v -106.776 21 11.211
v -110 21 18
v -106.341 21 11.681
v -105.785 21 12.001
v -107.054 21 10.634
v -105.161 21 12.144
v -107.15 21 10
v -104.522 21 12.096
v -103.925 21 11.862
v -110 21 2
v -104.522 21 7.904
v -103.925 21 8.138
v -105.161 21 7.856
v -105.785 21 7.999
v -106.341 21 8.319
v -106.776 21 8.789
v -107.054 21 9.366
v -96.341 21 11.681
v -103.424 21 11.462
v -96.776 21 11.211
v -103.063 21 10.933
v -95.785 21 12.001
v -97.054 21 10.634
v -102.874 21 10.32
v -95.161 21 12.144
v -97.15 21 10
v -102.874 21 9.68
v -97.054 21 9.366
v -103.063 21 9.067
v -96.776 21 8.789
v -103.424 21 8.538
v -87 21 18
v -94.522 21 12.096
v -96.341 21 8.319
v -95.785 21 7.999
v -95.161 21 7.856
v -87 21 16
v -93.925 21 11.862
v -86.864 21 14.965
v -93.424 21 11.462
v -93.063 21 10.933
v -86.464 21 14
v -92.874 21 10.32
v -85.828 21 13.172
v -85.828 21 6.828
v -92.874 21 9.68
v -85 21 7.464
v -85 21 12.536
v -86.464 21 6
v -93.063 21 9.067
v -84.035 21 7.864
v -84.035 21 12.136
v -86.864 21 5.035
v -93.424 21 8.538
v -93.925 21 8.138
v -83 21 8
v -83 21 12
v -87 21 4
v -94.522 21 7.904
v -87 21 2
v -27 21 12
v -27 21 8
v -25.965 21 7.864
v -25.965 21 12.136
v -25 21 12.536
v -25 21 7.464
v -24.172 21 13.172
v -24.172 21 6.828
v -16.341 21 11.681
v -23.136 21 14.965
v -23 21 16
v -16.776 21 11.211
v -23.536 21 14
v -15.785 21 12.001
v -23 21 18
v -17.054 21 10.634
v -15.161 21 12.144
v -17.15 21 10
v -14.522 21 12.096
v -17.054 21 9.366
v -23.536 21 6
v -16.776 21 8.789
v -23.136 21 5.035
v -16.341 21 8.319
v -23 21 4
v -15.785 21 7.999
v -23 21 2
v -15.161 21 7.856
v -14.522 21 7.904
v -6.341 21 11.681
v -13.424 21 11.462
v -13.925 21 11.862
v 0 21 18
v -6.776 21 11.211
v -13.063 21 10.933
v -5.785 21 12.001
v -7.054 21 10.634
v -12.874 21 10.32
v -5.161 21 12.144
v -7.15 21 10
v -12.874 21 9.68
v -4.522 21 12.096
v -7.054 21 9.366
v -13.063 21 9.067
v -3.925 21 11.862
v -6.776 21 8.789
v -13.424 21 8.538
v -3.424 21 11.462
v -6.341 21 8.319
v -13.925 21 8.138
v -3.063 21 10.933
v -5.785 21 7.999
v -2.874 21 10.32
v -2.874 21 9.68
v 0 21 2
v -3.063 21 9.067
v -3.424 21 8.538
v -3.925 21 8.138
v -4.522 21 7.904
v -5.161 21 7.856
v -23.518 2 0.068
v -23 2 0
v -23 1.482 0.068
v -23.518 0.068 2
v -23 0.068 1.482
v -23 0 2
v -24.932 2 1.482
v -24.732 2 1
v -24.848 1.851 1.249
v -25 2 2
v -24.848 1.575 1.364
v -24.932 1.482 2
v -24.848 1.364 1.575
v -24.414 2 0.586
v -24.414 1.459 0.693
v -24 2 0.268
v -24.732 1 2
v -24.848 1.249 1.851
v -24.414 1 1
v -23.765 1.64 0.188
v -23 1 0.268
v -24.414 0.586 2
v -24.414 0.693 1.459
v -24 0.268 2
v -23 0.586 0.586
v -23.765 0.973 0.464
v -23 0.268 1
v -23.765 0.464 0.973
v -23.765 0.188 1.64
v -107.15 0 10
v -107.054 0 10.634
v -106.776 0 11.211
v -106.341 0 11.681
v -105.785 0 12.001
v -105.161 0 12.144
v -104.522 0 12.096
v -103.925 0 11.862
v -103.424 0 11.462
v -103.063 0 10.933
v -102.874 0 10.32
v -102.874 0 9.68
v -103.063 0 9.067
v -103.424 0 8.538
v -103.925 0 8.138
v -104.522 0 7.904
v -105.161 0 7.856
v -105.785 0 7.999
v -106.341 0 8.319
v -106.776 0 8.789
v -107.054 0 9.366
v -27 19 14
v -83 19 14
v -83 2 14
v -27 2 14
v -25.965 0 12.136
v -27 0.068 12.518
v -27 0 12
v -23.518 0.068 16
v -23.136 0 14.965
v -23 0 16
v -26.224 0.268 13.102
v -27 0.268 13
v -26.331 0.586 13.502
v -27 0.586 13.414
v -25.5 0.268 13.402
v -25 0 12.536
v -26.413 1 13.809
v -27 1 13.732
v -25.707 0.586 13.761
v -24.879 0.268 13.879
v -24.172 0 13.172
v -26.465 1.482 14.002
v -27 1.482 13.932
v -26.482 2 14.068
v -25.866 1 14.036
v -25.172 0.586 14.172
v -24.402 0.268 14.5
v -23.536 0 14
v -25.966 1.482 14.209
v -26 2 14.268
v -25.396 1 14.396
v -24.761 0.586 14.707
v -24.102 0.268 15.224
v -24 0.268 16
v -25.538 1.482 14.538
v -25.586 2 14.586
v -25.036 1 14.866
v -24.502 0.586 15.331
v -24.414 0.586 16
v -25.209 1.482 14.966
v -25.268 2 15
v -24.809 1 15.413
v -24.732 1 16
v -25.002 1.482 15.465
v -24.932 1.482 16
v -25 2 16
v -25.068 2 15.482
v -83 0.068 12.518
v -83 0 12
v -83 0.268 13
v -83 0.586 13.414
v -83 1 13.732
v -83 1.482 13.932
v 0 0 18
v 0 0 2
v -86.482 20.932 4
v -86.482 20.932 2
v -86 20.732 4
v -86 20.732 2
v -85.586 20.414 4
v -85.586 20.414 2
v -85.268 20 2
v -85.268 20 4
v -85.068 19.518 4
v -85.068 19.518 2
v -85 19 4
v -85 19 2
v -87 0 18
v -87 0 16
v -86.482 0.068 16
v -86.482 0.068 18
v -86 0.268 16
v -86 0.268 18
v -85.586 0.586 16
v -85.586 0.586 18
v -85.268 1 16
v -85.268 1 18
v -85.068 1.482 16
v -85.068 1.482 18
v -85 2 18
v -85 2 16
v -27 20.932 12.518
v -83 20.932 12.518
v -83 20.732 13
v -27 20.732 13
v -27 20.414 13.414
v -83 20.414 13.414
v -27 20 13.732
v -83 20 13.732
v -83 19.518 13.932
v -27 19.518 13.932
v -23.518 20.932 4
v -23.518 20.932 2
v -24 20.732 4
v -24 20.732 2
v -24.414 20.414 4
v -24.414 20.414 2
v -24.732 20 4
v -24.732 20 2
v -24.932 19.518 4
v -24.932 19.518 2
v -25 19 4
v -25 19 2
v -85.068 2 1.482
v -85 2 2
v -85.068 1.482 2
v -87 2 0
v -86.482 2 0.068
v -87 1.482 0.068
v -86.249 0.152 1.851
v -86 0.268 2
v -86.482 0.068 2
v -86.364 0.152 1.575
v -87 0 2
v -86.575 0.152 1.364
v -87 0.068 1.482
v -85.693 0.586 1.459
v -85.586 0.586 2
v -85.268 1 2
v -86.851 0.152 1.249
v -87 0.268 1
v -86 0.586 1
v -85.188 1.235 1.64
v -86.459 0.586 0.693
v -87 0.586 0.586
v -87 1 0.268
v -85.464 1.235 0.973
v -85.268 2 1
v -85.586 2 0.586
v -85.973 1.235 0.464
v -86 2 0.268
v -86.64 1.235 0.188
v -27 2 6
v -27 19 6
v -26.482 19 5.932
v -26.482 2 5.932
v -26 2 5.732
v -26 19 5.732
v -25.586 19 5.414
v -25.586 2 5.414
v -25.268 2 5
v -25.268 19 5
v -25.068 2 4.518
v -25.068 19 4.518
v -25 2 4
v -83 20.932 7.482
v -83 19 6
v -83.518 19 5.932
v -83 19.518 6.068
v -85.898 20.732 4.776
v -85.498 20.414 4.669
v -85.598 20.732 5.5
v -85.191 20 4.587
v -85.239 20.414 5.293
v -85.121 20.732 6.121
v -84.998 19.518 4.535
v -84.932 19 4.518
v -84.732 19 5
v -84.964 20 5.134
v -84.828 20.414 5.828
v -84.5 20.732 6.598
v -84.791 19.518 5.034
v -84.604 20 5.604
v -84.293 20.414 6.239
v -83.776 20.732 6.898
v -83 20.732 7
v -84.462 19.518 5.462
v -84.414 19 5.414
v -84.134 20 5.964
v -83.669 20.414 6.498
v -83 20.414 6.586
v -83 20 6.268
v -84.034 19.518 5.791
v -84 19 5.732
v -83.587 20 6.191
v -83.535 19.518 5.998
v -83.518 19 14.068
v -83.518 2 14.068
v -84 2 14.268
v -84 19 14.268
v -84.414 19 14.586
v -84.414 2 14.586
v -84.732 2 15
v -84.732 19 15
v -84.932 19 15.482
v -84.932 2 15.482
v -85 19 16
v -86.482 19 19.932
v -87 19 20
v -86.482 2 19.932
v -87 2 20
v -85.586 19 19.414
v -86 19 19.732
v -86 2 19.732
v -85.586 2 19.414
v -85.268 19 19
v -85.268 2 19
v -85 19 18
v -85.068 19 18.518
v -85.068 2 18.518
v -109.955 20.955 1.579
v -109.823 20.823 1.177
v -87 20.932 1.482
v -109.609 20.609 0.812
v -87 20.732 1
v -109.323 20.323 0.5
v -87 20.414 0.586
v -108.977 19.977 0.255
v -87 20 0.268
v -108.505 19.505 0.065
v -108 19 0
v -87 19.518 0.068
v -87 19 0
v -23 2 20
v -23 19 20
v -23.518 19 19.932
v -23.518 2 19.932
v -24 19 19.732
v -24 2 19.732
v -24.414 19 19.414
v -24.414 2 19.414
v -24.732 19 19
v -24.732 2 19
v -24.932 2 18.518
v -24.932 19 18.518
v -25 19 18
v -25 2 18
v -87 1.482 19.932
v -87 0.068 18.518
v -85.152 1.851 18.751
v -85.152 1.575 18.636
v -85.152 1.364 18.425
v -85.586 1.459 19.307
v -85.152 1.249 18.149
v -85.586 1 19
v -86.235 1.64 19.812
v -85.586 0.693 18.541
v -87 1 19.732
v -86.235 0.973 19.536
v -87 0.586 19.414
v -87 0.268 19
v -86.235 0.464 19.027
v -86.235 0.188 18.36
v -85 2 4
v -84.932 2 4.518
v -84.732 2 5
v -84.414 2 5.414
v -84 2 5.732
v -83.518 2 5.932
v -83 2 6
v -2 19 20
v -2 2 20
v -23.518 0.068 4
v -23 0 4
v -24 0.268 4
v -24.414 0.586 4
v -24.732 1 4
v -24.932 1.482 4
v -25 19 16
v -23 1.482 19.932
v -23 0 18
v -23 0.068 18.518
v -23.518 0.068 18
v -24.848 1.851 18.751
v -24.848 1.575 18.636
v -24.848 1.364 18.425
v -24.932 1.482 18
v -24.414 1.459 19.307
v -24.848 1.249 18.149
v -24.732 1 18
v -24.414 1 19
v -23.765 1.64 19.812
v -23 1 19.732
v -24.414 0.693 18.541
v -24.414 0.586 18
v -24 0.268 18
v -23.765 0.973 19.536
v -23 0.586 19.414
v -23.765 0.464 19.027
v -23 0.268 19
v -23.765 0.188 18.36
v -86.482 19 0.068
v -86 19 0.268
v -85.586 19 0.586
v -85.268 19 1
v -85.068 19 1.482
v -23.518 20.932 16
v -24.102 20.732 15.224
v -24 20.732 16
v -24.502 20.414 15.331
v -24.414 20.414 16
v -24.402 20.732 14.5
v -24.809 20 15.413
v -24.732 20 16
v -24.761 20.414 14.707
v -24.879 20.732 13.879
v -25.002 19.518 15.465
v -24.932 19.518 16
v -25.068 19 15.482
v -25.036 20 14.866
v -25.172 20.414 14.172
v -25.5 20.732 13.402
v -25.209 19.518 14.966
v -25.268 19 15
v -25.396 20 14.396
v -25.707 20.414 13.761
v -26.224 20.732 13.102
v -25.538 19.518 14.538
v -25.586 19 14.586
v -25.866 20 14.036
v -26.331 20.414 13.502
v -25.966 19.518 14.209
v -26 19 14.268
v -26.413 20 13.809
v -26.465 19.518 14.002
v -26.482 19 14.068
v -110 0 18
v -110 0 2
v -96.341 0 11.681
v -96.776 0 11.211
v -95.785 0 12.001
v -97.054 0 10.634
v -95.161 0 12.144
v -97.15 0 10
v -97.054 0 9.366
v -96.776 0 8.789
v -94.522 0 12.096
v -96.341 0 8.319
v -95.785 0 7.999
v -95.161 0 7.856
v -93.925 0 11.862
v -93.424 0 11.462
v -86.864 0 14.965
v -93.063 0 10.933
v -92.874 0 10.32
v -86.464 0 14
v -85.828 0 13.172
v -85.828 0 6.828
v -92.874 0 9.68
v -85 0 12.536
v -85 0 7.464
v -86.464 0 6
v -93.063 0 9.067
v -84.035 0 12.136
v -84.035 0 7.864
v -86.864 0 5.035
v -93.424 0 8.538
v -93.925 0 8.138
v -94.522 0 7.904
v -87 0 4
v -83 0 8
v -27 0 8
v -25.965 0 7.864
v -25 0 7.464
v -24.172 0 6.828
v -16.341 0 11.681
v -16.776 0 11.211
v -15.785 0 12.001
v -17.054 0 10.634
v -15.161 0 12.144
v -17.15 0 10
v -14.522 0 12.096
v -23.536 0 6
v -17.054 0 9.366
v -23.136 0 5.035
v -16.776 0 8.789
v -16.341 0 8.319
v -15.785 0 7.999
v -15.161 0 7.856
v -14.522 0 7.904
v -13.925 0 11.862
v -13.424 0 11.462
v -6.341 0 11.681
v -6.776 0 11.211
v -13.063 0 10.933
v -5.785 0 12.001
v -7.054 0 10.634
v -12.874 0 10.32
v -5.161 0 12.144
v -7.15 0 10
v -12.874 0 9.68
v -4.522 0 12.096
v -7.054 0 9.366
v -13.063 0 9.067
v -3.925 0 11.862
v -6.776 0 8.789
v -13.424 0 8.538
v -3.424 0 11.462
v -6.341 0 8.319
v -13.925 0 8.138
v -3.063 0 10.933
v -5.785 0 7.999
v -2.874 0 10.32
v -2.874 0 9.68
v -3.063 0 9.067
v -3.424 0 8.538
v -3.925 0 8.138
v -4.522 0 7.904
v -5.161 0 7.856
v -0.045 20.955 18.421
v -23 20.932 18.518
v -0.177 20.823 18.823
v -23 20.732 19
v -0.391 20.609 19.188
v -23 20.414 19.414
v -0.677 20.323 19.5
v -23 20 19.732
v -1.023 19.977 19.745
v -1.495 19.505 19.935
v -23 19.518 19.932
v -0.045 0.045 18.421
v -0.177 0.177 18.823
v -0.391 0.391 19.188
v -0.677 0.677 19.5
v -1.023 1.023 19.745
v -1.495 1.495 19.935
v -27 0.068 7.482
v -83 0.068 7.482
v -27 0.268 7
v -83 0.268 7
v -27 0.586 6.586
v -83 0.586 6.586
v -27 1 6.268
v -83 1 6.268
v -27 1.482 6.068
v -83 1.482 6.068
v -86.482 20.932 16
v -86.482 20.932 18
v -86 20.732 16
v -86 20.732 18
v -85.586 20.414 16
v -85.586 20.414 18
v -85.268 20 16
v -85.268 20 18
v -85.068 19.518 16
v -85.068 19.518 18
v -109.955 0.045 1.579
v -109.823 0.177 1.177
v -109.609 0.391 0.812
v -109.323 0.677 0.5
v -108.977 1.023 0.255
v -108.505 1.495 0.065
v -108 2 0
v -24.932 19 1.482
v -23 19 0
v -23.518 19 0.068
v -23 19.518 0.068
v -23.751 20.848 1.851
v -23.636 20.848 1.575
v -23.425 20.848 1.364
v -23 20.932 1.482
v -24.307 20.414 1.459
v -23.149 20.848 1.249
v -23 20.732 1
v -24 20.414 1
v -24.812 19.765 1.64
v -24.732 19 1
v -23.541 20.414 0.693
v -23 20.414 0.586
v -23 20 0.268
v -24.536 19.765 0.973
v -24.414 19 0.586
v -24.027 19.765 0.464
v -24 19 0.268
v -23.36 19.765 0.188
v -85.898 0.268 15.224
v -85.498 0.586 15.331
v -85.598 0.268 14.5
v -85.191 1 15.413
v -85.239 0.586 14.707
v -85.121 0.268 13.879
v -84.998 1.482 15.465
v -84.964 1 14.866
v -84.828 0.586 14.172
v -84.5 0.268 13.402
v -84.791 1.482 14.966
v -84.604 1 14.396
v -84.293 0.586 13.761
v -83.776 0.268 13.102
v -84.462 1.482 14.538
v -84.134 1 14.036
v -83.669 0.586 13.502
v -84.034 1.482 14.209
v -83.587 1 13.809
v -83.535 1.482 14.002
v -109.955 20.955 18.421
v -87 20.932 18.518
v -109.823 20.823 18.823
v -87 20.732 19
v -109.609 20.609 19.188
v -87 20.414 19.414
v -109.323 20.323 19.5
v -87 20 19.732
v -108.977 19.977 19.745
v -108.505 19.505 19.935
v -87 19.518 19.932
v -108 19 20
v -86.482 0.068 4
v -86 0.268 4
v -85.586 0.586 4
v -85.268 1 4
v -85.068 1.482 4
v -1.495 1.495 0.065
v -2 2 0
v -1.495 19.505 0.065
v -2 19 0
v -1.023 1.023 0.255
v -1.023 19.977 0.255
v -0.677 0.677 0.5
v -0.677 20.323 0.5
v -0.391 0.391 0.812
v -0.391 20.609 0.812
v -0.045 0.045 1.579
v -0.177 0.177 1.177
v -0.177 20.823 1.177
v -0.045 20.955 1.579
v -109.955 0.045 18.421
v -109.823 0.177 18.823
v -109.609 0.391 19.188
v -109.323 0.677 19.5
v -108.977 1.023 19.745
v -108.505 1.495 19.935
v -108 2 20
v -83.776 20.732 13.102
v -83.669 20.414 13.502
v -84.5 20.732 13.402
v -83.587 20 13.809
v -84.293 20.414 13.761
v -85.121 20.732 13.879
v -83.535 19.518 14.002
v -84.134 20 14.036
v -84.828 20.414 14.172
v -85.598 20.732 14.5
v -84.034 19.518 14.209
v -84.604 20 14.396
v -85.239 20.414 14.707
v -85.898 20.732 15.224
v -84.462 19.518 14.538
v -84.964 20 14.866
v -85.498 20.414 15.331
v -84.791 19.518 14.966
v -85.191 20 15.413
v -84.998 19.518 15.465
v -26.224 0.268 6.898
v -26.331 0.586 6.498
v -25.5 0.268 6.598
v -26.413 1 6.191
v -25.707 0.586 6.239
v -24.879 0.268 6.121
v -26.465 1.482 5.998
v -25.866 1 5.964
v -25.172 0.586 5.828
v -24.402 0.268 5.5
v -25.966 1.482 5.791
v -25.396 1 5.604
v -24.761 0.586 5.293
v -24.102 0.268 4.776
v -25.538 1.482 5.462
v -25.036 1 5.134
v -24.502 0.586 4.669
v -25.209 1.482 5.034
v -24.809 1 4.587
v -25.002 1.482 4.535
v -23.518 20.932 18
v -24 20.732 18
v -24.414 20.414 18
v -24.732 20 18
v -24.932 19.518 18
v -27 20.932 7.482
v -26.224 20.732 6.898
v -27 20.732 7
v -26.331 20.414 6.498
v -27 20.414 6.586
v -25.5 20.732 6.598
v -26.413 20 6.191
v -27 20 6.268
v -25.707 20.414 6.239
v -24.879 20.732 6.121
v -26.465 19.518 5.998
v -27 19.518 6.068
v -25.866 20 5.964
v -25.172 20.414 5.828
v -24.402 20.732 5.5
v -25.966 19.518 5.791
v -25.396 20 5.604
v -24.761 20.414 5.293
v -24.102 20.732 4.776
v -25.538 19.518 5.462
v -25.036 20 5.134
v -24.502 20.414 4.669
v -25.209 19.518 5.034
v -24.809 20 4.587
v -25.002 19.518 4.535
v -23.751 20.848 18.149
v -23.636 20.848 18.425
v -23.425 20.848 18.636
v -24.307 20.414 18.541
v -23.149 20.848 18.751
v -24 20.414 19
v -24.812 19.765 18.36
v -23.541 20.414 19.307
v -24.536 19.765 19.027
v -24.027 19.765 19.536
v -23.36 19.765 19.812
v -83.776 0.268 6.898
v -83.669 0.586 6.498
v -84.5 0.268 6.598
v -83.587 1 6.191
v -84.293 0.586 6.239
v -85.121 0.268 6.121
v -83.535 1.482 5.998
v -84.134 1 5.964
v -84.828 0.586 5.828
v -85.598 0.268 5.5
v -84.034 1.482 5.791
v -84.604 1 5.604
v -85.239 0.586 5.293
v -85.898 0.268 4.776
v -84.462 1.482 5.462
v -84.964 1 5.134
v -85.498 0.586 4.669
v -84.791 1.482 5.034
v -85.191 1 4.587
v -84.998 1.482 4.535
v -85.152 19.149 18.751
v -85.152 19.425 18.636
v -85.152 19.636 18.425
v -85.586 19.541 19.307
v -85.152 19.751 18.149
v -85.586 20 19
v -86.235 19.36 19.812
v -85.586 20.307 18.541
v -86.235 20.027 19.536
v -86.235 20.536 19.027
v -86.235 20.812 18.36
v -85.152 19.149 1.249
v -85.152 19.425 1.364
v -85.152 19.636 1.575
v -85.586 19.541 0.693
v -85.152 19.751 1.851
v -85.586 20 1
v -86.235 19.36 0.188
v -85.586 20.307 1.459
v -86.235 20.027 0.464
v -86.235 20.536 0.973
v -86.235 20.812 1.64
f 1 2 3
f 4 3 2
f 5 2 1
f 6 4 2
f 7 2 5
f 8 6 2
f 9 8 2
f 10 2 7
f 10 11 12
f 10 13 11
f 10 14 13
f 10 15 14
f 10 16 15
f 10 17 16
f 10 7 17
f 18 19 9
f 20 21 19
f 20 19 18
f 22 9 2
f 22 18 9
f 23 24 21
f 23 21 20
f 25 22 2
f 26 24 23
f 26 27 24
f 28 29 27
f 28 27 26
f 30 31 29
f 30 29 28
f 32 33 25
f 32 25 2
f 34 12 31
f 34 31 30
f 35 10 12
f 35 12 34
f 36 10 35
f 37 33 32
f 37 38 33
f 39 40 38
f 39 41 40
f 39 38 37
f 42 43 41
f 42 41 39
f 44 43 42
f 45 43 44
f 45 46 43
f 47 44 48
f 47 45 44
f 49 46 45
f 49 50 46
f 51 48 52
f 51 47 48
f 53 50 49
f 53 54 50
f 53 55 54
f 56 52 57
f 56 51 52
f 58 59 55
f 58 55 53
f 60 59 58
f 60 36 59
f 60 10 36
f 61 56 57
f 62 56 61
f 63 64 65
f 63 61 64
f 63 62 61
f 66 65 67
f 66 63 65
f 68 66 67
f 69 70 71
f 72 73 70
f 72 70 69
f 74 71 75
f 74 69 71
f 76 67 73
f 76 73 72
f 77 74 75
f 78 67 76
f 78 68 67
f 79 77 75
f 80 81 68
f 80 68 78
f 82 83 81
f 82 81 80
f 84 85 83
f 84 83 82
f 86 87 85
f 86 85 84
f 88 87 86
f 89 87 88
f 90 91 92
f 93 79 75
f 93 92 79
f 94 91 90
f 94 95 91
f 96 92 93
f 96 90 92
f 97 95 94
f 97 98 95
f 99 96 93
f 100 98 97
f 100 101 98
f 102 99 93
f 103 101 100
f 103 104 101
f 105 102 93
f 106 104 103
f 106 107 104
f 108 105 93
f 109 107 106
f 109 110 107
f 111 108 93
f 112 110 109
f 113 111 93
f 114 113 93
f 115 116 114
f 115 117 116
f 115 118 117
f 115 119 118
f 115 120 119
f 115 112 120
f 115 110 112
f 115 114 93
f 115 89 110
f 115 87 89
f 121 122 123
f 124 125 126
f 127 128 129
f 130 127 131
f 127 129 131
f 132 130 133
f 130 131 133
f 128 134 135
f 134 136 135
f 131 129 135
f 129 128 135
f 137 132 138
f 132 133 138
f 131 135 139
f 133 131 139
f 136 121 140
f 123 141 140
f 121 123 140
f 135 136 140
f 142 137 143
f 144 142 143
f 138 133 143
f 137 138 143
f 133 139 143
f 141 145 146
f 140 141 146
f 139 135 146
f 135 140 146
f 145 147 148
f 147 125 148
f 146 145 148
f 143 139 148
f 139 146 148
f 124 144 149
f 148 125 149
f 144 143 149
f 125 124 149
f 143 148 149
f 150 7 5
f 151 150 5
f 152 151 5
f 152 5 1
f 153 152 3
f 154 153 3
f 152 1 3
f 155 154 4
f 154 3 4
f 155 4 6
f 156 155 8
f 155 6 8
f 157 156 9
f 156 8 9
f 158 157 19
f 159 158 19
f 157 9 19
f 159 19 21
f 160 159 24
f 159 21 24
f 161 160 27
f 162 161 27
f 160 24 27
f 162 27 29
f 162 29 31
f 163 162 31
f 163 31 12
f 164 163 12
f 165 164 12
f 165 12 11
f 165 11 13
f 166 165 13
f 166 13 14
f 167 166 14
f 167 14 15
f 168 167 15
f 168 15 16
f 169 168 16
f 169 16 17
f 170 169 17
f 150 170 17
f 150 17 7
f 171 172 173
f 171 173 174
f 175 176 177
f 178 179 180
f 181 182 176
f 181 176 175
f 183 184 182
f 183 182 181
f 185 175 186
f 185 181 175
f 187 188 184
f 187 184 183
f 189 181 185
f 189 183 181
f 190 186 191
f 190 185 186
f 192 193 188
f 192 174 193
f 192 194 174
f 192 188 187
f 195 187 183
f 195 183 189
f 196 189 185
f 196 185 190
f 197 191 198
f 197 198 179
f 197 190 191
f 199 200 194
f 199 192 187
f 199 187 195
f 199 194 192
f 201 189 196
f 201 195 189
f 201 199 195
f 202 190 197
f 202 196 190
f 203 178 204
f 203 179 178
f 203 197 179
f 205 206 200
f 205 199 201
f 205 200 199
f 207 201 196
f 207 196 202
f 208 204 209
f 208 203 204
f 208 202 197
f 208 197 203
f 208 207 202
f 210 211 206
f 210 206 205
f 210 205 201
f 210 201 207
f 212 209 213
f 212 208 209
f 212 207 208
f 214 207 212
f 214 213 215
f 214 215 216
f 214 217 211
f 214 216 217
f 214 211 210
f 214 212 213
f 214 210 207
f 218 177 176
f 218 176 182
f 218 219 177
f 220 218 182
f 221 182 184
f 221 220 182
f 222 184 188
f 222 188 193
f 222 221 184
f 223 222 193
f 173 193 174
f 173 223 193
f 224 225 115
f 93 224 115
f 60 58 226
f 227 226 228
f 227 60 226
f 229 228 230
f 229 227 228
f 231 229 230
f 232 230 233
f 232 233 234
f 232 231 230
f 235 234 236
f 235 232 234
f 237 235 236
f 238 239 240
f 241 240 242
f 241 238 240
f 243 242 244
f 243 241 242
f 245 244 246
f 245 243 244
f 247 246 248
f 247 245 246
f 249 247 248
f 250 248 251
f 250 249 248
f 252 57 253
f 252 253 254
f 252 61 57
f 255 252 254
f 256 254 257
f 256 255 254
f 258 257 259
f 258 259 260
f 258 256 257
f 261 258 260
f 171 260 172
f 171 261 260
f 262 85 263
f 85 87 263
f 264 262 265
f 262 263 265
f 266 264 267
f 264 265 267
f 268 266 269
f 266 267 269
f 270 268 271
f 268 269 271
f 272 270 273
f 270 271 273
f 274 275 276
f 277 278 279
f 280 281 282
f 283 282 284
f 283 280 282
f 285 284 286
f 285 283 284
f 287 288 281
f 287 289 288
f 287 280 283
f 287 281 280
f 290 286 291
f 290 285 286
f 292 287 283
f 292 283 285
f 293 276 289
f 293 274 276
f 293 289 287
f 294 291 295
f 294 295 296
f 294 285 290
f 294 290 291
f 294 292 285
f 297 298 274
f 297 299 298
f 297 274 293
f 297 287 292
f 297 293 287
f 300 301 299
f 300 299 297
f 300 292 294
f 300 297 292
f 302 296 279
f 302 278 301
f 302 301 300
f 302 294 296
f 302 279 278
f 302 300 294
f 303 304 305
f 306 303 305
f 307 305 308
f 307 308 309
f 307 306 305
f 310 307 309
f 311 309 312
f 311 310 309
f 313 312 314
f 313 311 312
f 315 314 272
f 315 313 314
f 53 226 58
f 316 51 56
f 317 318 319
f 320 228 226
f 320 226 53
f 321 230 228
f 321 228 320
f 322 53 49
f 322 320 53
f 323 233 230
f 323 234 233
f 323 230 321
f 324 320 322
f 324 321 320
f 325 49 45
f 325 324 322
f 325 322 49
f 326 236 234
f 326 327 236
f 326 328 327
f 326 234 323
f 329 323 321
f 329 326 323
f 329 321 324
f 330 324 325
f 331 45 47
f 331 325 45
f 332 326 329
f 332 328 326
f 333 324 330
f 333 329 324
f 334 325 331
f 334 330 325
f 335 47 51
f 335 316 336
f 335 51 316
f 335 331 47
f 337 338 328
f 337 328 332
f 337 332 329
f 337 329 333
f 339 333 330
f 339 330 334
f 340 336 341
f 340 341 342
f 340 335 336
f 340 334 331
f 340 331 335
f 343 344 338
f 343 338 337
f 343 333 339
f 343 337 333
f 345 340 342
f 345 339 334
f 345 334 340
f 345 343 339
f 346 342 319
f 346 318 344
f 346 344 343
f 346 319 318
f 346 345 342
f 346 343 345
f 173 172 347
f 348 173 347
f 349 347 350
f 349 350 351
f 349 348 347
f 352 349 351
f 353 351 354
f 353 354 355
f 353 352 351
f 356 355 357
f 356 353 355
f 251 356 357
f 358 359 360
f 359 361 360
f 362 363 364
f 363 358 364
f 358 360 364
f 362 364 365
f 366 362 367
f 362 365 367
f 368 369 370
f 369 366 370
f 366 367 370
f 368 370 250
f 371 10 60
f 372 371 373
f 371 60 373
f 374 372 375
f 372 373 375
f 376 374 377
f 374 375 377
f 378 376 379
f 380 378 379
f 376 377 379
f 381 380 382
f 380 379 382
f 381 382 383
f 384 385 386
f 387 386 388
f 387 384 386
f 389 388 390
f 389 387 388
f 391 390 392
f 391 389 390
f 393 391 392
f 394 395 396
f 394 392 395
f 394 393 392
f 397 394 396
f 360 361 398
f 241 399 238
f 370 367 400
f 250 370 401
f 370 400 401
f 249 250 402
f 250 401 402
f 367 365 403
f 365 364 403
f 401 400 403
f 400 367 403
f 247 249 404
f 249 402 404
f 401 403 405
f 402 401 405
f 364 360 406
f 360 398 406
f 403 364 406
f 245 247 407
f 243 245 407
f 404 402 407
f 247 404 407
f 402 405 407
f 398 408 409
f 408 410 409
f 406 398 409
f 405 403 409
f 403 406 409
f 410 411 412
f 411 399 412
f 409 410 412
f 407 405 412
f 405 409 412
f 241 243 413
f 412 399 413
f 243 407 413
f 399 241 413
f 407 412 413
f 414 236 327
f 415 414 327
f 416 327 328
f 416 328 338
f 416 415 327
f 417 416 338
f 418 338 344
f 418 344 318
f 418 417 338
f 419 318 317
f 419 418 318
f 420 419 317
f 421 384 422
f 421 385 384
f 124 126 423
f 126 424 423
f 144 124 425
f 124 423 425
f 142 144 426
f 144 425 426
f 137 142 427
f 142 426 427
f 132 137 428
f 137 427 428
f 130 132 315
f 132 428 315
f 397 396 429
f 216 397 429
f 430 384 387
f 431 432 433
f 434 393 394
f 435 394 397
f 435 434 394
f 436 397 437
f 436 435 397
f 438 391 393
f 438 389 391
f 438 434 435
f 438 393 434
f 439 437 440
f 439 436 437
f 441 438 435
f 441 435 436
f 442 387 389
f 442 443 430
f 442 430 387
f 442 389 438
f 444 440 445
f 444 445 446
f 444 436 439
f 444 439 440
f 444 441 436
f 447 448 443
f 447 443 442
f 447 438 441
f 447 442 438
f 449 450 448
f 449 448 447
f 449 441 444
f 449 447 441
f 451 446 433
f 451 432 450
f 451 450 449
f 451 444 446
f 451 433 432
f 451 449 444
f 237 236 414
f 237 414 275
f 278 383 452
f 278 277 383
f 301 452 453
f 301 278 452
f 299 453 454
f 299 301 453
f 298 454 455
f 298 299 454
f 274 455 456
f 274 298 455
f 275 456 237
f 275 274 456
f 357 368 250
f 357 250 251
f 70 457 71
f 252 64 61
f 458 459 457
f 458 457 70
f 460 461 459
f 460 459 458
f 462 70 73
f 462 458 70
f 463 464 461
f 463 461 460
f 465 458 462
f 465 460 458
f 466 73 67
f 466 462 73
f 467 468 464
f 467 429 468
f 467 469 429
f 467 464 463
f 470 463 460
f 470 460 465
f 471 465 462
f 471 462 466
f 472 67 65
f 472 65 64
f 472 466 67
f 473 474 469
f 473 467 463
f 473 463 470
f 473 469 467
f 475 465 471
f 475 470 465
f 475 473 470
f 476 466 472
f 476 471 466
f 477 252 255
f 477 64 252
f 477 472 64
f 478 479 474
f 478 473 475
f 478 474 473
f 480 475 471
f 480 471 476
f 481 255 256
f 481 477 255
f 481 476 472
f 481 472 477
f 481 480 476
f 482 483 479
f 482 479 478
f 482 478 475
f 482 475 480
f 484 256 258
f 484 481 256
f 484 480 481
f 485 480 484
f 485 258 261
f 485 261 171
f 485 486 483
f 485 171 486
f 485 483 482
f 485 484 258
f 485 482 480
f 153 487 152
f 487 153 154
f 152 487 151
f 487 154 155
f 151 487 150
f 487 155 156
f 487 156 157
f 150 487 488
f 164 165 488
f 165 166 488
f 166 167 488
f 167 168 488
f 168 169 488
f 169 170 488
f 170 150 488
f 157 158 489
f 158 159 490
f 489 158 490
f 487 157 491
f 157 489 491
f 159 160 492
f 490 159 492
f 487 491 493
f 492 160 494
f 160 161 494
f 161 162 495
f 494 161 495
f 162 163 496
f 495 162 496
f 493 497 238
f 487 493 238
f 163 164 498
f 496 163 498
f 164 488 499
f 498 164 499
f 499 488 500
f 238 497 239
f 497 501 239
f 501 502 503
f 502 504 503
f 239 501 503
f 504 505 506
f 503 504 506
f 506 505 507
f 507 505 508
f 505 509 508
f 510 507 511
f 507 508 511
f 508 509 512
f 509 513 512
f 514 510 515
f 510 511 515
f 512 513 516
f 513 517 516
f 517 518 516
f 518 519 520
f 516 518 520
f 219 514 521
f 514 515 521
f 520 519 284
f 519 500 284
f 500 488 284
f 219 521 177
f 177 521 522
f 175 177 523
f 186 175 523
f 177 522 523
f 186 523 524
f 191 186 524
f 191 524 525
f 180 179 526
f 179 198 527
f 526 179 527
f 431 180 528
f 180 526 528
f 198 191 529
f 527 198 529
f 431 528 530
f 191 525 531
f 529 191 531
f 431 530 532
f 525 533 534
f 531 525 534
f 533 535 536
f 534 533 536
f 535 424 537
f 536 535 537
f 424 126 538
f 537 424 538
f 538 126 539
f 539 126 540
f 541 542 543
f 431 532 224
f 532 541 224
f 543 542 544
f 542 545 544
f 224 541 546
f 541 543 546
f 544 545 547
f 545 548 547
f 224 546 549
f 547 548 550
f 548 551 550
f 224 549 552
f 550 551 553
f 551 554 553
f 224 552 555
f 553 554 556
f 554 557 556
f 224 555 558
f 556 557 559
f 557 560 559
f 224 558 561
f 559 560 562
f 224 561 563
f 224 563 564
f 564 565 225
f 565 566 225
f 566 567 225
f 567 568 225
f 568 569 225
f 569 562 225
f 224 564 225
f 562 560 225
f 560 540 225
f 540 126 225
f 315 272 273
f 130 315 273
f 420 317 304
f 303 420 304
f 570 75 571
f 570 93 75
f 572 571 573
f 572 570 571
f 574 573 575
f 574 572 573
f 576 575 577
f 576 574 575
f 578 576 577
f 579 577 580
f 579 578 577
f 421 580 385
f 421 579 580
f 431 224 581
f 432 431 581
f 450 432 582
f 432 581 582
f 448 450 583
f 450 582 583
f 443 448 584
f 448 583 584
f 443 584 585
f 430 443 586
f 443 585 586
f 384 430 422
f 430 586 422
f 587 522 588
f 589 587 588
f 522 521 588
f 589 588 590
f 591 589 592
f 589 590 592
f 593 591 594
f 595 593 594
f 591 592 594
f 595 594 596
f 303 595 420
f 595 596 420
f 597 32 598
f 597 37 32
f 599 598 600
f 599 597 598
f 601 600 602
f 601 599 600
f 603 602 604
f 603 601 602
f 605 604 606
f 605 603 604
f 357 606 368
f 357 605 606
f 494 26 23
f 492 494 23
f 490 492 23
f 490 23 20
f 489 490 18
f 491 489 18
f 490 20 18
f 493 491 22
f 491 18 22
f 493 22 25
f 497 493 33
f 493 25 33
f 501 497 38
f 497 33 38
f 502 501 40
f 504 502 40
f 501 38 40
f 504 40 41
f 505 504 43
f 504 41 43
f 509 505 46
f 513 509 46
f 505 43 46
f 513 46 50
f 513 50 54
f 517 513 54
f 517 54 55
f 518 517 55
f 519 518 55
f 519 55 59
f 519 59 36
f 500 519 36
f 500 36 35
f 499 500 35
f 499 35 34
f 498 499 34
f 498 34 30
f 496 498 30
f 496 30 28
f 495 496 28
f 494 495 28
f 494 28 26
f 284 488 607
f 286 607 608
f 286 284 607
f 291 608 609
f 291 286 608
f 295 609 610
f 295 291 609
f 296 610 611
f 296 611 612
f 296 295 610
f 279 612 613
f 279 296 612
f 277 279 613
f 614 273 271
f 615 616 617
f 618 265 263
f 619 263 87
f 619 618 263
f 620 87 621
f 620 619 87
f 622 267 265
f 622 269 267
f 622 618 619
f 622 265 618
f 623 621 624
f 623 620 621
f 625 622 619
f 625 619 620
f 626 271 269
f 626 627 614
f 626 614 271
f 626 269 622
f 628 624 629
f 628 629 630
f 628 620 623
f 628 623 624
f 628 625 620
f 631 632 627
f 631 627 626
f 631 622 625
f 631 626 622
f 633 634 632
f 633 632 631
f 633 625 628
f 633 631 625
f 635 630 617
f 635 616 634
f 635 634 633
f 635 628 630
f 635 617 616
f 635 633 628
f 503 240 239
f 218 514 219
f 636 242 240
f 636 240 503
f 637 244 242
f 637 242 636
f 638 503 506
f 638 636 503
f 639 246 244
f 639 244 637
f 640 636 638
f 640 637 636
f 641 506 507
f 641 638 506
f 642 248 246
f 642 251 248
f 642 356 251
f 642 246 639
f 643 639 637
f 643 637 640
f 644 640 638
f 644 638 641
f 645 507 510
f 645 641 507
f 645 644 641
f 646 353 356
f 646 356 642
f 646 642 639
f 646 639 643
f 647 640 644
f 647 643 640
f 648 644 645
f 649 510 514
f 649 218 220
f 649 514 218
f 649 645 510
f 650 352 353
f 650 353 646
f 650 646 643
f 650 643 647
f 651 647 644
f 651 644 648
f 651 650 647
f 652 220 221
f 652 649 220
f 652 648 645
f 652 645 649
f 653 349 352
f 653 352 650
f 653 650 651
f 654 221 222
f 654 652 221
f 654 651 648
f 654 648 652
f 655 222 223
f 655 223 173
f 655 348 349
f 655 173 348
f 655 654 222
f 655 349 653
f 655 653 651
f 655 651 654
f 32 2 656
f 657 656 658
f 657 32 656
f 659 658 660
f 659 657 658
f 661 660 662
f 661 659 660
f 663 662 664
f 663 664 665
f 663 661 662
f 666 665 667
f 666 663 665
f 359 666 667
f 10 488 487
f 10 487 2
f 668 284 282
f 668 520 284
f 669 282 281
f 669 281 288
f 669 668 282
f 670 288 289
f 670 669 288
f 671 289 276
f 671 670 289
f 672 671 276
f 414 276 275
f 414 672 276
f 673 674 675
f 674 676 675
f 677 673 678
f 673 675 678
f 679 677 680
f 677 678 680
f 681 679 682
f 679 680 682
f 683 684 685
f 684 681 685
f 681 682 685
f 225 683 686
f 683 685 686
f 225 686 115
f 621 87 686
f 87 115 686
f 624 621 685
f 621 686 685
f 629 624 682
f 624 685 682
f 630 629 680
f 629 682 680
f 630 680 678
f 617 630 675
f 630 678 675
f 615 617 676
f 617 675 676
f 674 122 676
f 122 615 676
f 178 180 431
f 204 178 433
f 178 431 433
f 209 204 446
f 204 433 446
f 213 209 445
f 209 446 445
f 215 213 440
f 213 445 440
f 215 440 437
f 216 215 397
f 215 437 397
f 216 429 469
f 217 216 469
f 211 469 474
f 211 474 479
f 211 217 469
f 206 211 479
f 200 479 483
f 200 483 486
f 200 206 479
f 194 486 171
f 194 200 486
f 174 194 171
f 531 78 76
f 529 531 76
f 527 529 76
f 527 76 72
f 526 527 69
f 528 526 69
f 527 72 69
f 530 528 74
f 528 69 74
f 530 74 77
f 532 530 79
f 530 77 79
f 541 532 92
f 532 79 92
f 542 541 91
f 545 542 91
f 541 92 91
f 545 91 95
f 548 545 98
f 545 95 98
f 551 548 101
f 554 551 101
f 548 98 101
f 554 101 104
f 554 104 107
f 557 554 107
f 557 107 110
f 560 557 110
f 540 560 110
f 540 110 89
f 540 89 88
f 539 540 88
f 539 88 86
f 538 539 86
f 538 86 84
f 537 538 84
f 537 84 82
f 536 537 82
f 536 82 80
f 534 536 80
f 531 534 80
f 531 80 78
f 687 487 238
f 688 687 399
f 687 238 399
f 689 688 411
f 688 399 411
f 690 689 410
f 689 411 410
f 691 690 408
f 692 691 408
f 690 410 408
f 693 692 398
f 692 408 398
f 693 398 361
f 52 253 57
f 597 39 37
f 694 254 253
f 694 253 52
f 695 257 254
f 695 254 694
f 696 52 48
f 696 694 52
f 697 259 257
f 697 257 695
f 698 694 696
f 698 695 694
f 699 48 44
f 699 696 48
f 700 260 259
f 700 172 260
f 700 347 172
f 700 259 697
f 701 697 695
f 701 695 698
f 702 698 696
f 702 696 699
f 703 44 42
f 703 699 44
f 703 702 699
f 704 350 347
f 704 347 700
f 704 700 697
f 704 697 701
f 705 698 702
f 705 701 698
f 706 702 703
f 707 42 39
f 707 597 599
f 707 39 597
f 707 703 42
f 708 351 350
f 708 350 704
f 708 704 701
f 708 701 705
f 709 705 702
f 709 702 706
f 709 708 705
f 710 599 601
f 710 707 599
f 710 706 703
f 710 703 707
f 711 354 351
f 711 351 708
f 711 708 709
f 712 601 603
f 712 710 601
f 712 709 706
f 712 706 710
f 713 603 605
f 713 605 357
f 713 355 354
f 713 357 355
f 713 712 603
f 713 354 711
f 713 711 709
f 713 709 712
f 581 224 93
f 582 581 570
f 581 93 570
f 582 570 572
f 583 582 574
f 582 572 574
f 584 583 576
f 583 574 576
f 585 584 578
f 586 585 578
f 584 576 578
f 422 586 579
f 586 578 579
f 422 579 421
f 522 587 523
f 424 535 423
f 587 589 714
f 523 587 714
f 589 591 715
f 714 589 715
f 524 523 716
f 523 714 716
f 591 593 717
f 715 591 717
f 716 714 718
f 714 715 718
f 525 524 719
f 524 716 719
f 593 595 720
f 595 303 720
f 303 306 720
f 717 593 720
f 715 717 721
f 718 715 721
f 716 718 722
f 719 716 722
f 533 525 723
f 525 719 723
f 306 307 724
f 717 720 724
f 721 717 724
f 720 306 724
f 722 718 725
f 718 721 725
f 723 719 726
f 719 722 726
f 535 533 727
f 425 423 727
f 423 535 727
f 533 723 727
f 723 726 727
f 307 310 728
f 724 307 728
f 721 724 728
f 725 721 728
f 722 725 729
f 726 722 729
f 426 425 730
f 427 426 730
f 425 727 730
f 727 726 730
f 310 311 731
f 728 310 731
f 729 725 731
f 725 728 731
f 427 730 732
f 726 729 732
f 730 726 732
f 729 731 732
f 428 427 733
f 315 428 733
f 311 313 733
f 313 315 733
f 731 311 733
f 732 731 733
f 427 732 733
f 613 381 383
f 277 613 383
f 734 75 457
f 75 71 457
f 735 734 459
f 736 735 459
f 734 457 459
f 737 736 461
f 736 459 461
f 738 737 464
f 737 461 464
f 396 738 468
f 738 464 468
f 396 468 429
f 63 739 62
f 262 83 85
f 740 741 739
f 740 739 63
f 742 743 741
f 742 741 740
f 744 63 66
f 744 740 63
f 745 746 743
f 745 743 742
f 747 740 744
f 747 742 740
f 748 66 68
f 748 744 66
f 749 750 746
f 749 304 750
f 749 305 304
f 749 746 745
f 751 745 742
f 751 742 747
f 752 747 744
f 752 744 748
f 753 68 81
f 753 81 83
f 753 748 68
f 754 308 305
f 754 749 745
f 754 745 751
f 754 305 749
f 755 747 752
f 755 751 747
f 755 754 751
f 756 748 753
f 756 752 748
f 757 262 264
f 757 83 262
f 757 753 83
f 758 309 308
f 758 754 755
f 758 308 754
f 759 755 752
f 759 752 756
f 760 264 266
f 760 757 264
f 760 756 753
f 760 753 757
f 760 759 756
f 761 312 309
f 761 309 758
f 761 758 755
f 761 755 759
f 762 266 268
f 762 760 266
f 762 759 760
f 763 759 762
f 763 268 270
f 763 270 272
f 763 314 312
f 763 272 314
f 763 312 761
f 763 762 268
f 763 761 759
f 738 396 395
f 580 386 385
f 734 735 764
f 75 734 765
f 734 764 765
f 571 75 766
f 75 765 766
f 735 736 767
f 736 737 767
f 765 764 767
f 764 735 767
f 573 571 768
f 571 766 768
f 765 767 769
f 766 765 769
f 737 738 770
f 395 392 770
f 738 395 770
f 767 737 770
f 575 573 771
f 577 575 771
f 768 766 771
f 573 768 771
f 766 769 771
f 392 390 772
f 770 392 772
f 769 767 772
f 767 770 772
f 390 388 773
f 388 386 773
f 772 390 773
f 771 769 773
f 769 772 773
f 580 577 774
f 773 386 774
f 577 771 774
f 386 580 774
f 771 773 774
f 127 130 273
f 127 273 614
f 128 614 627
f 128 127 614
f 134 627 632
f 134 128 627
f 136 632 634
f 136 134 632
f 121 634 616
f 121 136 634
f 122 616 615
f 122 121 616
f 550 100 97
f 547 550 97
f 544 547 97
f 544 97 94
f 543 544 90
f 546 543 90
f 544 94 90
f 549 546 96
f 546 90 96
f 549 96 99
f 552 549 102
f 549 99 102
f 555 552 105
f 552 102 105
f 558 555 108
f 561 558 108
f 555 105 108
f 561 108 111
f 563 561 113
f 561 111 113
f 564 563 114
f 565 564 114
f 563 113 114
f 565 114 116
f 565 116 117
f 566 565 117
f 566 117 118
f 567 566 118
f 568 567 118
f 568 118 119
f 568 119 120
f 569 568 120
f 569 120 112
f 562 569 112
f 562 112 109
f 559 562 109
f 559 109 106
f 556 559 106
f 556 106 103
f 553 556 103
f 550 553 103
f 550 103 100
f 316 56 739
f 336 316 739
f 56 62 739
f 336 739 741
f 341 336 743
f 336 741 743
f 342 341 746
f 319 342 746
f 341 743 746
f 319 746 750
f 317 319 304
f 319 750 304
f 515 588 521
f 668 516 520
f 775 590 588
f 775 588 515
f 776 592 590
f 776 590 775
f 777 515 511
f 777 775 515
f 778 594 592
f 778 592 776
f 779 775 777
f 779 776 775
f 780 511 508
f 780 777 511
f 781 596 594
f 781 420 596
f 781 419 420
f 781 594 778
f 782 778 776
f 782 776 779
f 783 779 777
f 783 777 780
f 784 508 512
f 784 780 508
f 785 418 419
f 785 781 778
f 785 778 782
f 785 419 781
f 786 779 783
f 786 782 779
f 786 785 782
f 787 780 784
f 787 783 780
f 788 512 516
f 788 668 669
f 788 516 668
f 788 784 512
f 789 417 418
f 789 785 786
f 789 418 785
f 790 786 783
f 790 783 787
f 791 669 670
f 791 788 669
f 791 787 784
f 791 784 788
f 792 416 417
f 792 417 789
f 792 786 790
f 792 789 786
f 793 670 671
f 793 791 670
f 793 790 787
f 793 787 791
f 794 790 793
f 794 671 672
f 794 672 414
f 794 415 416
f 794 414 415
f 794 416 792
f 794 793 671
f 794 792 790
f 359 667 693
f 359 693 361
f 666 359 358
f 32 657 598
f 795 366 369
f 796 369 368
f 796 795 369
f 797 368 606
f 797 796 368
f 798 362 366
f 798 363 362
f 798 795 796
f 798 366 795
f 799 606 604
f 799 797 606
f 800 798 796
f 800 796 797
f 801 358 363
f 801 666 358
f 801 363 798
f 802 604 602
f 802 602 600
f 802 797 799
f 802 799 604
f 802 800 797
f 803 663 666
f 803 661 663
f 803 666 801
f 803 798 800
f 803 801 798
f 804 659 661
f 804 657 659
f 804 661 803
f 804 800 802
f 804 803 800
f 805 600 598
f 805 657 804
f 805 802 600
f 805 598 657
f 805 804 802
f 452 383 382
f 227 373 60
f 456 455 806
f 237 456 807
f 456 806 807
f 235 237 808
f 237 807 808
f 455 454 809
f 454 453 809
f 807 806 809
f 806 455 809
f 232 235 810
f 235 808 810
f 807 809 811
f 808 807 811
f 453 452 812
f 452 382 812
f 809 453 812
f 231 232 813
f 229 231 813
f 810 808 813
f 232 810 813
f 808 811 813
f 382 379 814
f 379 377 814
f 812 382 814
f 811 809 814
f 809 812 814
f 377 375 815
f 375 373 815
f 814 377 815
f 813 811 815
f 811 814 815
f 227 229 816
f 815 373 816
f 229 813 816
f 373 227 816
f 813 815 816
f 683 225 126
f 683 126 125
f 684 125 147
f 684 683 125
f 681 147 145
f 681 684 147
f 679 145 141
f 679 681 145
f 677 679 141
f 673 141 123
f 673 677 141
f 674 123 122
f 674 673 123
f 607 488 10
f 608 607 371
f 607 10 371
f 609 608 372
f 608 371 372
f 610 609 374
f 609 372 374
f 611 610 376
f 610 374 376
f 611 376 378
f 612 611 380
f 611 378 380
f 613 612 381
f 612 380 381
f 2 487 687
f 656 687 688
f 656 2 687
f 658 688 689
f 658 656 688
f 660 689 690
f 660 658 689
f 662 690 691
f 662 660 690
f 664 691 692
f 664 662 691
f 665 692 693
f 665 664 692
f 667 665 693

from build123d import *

# Parameters (mm, degrees)
SKETCH_1_W          = 110
SKETCH_1_H          = 21
EXTRUDE_1_DEPTH     = 20
CUT_EXTRUDE_1_REACH = 115.759
SKETCH_2_R          = 2.15
CUT_EXTRUDE_2_REACH = 115.759
SKETCH_3_W          = 60
SKETCH_3_H          = 6
FILLET_2_R          = 2


with BuildPart() as part:
    # 草图1 → 凸台-拉伸1 (new body)
    with BuildSketch(Plane.XY):
        with Locations((-55, 10.5)):
            Rectangle(SKETCH_1_W, SKETCH_1_H)
    extrude(amount=EXTRUDE_1_DEPTH)

    # 草图2 → 切除-拉伸1 (cut, up to next)
    with BuildSketch(Plane(origin=(0, 21, 0), x_dir=(1, 0, 0), z_dir=(0, 1, 0)), mode=Mode.PRIVATE) as cut_extrude_1_sk1:
        with Locations(Location((-15, -10, 0), (0, 0, 180))):
            Circle(SKETCH_2_R)
    cut_extrude_1_tool1 = extrude(cut_extrude_1_sk1.sketch, amount=-CUT_EXTRUDE_1_REACH, mode=Mode.PRIVATE) & part.part
    # 草图2 → 切除-拉伸1 (cut, up to next)
    with BuildSketch(Plane(origin=(0, 21, 0), x_dir=(1, 0, 0), z_dir=(0, 1, 0)), mode=Mode.PRIVATE) as cut_extrude_1_sk2:
        with Locations(Location((-5, -10, 0), (0, 0, 180))):
            Circle(SKETCH_2_R)
    cut_extrude_1_tool2 = extrude(cut_extrude_1_sk2.sketch, amount=-CUT_EXTRUDE_1_REACH, mode=Mode.PRIVATE) & part.part
    # 草图2 → 切除-拉伸1 (cut, up to next)
    with BuildSketch(Plane(origin=(0, 21, 0), x_dir=(1, 0, 0), z_dir=(0, 1, 0)), mode=Mode.PRIVATE) as cut_extrude_1_sk3:
        with Locations(Location((-105, -10, 0), (0, 0, 180))):
            Circle(SKETCH_2_R)
    cut_extrude_1_tool3 = extrude(cut_extrude_1_sk3.sketch, amount=-CUT_EXTRUDE_1_REACH, mode=Mode.PRIVATE) & part.part
    # 草图2 → 切除-拉伸1 (cut, up to next)
    with BuildSketch(Plane(origin=(0, 21, 0), x_dir=(1, 0, 0), z_dir=(0, 1, 0)), mode=Mode.PRIVATE) as cut_extrude_1_sk4:
        with Locations(Location((-95, -10, 0), (0, 0, 180))):
            Circle(SKETCH_2_R)
    cut_extrude_1_tool4 = extrude(cut_extrude_1_sk4.sketch, amount=-CUT_EXTRUDE_1_REACH, mode=Mode.PRIVATE) & part.part
    add(cut_extrude_1_tool1.solids().sort_by_distance((-15, 21, 10))[0], mode=Mode.SUBTRACT)
    add(cut_extrude_1_tool2.solids().sort_by_distance((-5, 21, 10))[0], mode=Mode.SUBTRACT)
    add(cut_extrude_1_tool3.solids().sort_by_distance((-105, 21, 10))[0], mode=Mode.SUBTRACT)
    add(cut_extrude_1_tool4.solids().sort_by_distance((-95, 21, 10))[0], mode=Mode.SUBTRACT)

    # 草图3 → 切除-拉伸2 (cut, up to next)
    with BuildSketch(Plane(origin=(0, 21, 0), x_dir=(1, 0, 0), z_dir=(0, 1, 0)), mode=Mode.PRIVATE) as cut_extrude_2_sk1:
        with Locations((-55, -3)):
            Rectangle(SKETCH_3_W, SKETCH_3_H)
    cut_extrude_2_tool1 = extrude(cut_extrude_2_sk1.sketch, amount=-CUT_EXTRUDE_2_REACH, mode=Mode.PRIVATE) & part.part
    # 草图3 → 切除-拉伸2 (cut, up to next)
    with BuildSketch(Plane(origin=(0, 21, 0), x_dir=(1, 0, 0), z_dir=(0, 1, 0)), mode=Mode.PRIVATE) as cut_extrude_2_sk2:
        with Locations((-55, -17)):
            Rectangle(SKETCH_3_W, SKETCH_3_H)
    cut_extrude_2_tool2 = extrude(cut_extrude_2_sk2.sketch, amount=-CUT_EXTRUDE_2_REACH, mode=Mode.PRIVATE) & part.part
    add(cut_extrude_2_tool1.solids().sort_by_distance((-55, 21, 3))[0], mode=Mode.SUBTRACT)
    add(cut_extrude_2_tool2.solids().sort_by_distance((-55, 21, 17))[0], mode=Mode.SUBTRACT)

    # 圆角2
    fillet_2_edges = [part.edges().sort_by_distance(p)[0] for p in [
        (-110, 10.5, 20),
        (-97.5, 0, 20),
        (-12.5, 0, 0),
        (-97.5, 21, 0),
        (-97.5, 21, 20),
        (-12.5, 0, 20),
        (-85, 10.5, 6),
        (-85, 10.5, 0),
        (-25, 10.5, 0),
        (-25, 10.5, 6),
        (-85, 21, 3),
        (-55, 21, 6),
        (-25, 21, 3),
        (-55, 0, 6),
        (-85, 0, 3),
        (-25, 0, 3),
        (-25, 10.5, 20),
        (-85, 10.5, 20),
        (-85, 10.5, 14),
        (-25, 10.5, 14),
        (0, 10.5, 20),
        (-97.5, 0, 0),
        (-25, 21, 17),
        (-55, 21, 14),
        (-85, 21, 17),
        (-85, 0, 17),
        (-55, 0, 14),
        (-25, 0, 17),
        (-110, 10.5, 0),
        (-12.5, 21, 0),
        (0, 10.5, 0),
        (-12.5, 21, 20),
    ]]
    fillet(fillet_2_edges, radius=FILLET_2_R)


solid = part.part
